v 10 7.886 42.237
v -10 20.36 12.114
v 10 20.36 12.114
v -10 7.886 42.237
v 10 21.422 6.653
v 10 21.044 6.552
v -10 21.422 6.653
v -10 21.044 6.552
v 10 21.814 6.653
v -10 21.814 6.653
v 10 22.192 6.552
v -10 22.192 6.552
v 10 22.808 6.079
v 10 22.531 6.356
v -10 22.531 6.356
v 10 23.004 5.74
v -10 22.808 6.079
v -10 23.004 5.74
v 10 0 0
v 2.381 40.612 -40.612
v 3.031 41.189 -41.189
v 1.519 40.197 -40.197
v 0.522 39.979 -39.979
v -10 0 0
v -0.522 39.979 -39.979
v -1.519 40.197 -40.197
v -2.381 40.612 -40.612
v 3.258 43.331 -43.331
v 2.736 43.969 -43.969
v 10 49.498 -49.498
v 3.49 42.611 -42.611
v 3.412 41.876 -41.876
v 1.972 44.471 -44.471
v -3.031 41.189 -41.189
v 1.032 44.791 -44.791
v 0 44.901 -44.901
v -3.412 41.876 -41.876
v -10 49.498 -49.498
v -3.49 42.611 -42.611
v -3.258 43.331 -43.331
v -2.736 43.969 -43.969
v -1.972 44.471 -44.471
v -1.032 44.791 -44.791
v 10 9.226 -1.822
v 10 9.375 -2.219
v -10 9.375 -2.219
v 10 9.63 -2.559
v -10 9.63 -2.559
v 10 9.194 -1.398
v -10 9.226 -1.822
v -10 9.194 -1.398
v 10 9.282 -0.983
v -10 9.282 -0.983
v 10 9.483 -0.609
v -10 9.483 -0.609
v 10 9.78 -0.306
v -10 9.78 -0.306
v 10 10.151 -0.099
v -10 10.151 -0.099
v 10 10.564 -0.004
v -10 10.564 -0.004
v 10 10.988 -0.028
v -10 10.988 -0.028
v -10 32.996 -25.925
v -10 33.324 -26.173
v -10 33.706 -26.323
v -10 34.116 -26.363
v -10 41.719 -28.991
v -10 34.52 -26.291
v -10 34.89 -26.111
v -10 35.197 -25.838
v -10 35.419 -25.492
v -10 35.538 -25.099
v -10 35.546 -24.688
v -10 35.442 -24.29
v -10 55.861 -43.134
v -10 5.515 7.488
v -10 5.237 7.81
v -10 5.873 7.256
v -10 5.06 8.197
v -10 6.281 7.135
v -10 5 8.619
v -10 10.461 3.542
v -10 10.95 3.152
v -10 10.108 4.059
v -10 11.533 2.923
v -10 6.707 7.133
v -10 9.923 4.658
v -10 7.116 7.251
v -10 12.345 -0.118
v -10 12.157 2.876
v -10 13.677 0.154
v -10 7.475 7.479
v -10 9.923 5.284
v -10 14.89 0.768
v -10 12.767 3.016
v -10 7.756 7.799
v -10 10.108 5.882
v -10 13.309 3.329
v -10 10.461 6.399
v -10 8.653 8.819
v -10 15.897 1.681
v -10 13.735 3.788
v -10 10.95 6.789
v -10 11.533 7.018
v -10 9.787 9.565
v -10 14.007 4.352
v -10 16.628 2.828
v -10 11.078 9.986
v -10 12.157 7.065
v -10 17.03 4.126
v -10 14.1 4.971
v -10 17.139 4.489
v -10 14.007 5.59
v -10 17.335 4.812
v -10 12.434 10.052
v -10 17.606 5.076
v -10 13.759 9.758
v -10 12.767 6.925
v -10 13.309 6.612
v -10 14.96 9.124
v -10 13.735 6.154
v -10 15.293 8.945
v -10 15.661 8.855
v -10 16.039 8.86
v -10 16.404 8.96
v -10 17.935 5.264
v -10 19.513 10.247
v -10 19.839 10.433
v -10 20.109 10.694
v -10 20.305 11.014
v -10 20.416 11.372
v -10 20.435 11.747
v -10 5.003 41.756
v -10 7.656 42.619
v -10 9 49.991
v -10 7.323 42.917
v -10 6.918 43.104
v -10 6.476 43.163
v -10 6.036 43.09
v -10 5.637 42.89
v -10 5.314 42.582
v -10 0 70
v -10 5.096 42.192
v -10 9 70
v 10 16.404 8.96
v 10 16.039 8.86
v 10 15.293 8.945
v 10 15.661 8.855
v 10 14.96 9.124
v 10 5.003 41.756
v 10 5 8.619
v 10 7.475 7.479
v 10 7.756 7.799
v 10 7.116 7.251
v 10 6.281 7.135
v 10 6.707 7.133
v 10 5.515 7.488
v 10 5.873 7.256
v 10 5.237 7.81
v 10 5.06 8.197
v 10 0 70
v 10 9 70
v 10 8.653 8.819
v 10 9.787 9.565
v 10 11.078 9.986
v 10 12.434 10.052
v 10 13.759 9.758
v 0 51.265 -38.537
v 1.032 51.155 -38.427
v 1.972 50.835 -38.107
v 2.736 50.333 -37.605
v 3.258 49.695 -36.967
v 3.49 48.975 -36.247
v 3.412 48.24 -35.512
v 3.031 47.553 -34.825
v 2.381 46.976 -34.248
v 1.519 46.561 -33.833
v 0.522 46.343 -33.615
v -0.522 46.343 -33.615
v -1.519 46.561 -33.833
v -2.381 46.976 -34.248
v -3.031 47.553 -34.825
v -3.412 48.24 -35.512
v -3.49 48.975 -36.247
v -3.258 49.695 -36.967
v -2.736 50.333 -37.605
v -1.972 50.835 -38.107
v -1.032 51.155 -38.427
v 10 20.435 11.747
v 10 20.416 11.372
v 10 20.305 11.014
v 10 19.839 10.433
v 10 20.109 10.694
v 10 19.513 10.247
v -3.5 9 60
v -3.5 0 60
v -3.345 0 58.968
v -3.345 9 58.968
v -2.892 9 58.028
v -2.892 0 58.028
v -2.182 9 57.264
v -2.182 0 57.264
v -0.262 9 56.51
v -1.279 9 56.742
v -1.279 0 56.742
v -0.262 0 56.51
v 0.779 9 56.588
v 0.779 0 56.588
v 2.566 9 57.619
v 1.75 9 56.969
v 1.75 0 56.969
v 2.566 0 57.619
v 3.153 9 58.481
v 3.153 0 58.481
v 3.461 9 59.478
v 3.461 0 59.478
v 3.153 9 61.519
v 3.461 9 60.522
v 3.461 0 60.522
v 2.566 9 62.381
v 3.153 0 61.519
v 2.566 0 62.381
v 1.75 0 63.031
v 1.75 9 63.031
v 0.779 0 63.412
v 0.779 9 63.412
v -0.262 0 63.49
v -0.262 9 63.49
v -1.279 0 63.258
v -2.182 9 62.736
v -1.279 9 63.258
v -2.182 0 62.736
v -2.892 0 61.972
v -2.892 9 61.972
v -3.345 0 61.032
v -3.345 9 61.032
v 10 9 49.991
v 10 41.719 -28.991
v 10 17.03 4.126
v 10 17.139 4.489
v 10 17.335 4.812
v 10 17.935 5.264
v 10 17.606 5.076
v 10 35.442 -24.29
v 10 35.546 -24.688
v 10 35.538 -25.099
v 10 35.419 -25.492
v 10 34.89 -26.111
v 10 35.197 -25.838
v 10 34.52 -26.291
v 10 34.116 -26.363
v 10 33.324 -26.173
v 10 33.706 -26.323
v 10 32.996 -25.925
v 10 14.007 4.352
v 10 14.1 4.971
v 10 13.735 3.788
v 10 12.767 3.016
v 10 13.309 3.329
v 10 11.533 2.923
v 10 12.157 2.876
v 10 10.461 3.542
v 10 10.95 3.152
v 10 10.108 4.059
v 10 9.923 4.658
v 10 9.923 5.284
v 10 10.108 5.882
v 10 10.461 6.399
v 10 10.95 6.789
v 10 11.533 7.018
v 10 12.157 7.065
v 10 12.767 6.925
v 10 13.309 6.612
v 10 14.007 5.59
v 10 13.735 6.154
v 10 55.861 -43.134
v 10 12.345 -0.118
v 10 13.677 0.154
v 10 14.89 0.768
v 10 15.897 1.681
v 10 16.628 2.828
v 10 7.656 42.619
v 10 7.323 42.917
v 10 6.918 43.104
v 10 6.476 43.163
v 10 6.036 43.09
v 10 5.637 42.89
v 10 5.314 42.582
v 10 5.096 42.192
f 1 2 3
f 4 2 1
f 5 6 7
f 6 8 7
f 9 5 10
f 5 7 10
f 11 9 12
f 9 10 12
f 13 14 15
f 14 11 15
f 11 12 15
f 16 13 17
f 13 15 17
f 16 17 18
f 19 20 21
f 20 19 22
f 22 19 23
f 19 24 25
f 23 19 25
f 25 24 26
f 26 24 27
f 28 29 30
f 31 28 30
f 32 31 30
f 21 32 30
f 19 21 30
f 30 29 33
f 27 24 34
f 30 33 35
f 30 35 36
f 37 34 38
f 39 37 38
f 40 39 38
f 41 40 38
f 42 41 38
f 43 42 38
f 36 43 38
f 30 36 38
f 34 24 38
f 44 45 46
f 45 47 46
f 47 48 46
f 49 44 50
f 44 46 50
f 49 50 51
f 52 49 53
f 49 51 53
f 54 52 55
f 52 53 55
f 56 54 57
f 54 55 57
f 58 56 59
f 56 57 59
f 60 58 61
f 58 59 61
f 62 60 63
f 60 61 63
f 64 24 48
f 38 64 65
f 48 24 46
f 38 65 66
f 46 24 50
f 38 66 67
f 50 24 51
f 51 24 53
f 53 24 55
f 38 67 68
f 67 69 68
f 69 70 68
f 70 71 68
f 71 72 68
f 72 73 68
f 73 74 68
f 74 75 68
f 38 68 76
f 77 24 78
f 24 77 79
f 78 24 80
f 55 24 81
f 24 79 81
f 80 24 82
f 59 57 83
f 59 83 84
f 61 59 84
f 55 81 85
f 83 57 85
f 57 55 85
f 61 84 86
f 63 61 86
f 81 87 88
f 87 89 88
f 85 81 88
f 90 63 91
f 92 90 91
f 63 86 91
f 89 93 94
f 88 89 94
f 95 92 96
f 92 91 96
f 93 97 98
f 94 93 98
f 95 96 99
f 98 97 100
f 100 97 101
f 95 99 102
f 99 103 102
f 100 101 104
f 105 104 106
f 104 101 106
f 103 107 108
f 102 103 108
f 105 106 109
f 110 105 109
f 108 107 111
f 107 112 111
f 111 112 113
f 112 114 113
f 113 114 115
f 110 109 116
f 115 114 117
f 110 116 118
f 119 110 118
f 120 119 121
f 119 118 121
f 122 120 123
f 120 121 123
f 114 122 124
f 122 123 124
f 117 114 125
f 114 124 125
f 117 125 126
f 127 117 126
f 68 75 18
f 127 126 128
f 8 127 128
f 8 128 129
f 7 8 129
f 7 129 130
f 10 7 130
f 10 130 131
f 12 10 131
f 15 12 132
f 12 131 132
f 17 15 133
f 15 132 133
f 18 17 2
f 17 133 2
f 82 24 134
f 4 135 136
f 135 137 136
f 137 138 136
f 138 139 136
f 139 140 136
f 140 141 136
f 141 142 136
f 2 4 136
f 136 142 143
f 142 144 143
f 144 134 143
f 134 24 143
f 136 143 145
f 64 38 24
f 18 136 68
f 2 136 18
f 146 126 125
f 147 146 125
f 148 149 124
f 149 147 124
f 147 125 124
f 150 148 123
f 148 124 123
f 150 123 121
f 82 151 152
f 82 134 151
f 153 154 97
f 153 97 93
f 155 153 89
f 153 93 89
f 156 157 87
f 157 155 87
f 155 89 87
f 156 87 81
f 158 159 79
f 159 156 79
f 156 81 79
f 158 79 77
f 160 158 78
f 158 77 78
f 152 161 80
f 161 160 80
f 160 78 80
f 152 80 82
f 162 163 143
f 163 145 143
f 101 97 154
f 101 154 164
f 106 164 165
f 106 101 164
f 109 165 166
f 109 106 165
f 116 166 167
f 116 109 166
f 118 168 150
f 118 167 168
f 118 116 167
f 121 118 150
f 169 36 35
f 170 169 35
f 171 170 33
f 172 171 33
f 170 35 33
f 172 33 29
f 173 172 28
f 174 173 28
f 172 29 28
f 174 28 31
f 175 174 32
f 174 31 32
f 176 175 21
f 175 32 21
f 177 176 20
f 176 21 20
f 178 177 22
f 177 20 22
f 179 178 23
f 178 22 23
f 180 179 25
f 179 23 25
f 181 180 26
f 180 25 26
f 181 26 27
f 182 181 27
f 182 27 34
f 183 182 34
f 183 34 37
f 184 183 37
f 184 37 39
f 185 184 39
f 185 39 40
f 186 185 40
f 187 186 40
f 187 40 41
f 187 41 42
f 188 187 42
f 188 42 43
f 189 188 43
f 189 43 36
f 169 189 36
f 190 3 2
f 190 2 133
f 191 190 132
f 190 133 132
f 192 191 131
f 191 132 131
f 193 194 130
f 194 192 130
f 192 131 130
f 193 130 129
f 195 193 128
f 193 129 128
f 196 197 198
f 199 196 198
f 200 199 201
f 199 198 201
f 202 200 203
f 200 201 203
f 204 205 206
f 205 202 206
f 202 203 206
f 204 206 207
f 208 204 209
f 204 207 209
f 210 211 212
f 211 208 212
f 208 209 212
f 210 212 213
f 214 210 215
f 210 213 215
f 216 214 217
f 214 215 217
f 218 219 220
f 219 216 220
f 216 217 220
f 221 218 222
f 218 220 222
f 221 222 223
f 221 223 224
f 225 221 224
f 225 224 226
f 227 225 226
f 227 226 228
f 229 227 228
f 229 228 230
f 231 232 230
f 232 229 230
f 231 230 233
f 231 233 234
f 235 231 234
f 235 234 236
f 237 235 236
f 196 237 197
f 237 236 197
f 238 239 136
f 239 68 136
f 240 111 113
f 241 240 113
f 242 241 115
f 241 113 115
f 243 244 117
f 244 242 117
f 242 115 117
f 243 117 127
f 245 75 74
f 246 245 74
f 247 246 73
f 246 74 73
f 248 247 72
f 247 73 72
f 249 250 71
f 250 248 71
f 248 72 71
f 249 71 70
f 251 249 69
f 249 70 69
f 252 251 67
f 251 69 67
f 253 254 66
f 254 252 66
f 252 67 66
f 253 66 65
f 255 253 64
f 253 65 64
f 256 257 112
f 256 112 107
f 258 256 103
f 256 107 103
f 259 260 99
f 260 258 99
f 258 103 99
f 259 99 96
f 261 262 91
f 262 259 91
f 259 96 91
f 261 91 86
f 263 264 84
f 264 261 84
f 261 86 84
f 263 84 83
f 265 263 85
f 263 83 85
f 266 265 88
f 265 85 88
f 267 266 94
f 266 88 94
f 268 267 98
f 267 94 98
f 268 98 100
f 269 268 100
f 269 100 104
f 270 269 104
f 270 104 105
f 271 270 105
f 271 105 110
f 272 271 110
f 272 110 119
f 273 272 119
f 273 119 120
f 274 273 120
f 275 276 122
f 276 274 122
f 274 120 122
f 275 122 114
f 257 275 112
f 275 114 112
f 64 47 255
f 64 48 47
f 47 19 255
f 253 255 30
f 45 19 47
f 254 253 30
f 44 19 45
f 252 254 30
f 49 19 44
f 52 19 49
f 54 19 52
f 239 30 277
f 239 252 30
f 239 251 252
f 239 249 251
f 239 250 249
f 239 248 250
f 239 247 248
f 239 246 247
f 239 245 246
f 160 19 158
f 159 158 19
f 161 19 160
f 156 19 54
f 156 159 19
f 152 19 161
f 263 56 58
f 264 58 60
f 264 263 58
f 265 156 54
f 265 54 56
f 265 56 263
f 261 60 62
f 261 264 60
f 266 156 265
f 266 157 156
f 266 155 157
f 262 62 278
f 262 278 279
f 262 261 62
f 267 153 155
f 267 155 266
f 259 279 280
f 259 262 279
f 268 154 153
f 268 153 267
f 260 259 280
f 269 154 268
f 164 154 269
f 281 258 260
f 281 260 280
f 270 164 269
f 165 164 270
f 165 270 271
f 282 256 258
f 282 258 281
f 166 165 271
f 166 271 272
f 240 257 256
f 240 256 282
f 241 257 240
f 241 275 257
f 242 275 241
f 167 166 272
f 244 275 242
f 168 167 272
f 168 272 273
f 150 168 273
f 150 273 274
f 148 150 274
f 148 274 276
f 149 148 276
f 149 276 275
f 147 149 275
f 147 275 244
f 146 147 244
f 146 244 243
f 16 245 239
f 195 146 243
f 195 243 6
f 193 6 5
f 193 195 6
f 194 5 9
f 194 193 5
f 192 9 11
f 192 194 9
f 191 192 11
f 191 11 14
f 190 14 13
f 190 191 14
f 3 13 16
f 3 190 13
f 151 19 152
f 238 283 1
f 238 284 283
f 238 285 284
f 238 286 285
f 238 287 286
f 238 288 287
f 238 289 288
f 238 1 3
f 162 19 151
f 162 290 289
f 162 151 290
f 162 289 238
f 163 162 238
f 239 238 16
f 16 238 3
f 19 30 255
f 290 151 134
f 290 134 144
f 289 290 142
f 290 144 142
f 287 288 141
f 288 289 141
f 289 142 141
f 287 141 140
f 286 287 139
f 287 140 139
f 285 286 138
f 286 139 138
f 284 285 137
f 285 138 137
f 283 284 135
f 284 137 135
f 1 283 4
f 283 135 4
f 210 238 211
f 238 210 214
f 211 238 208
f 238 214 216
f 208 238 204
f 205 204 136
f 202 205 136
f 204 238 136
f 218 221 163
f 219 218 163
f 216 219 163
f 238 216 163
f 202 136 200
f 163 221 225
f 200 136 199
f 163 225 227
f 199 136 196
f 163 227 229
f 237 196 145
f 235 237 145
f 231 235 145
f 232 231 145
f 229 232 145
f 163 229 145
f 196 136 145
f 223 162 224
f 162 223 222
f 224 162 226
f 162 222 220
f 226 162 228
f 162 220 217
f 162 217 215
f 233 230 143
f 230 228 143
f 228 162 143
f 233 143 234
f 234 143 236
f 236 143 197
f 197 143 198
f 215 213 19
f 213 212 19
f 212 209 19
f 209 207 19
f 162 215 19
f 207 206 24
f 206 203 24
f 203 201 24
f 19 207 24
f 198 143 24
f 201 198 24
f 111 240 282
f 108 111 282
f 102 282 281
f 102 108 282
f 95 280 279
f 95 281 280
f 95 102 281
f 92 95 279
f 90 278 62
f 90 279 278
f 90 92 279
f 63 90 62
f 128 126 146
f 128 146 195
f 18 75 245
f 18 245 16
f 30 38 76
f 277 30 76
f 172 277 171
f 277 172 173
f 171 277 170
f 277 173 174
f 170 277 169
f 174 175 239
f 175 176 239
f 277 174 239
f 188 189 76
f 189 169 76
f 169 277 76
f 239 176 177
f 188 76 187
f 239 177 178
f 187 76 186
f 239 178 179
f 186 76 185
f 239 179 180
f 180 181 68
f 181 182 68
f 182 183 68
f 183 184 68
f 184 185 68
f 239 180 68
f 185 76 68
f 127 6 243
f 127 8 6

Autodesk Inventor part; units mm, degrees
sketch "Sketch_8" plane through (0, 0, 0) normal (1, 0, 0) x (0, 1, 0)
  line L0 (0, 70) -> (0, 0)
  line L1 (0, 0) -> (49.4975, -49.4975)
  line L2 (49.4975, -49.4975) -> (55.8614, -43.1335)
  line L3 (55.8614, -43.1335) -> (41.7193, -28.9914)
  line L4 (41.7193, -28.9914) -> (9, 49.9914)
  line L5 (9, 49.9914) -> (9, 70)
  line L6 (9, 70) -> (0, 70)
  arc A0 (23.0035, 5.74) -> (21.0437, 6.5518) centre (21.6177, 5.166) ccw
  line L7 (21.0437, 6.5518) -> (17.935, 5.2641)
  arc A1 (17.935, 5.2641) -> (17.0297, 4.1265) centre (18.509, 3.8783) ccw
  arc A2 (10.9882, -0.0281) -> (17.0297, 4.1265) centre (12, 4.9706) ccw
  arc A3 (10.9882, -0.0281) -> (9.63, -2.5589) centre (10.6906, -1.4983) ccw
  line L8 (9.63, -2.5589) -> (32.996, -25.9249)
  arc A4 (32.996, -25.9249) -> (35.4424, -24.2902) centre (34.0566, -24.8642) ccw
  line L9 (35.4424, -24.2902) -> (23.0035, 5.74)
  circle A5 centre (12, 4.9706) radius 2.1
  arc A6 (7.8859, 42.2372) -> (5.0029, 41.7559) centre (6.5, 41.6633) ccw
  line L10 (5.0029, 41.7559) -> (5, 8.619)
  arc A7 (5, 8.619) -> (7.7564, 7.7993) centre (6.5, 8.6189) ccw
  arc A8 (14.9597, 9.1239) -> (7.7564, 7.7993) centre (12, 4.9705) ccw
  arc A9 (14.9597, 9.1239) -> (16.4042, 8.9596) centre (15.8302, 10.3455) ccw
  line L11 (16.4042, 8.9596) -> (19.5129, 10.2473)
  arc A10 (19.5129, 10.2473) -> (20.3596, 12.1145) centre (18.9389, 11.6331) ccw
  line L12 (20.3596, 12.1145) -> (7.8859, 42.2372)
extrude "Extrusion1" add sketch "Sketch_8" along normal mid plane 20
sketch "Sketch_3" plane through (0, 0, 0) normal (0, 1, 0) x (-1, 0, 0)
  circle A0 centre (0, 60) radius 3.5
extrude "Extrusion2" cut sketch "Sketch_3" along normal blind 9
sketch "Sketch_9" plane through (0, 0, 0) normal (1, 0, 0) x (0, 1, 0)
  line L0 (42.4264, -42.4264) -> (48.7904, -36.0624)
  line L1 (48.7904, -36.0624) -> (51.2652, -38.5373)
  line L2 (51.2652, -38.5373) -> (44.9013, -44.9013)
  line L3 (44.9013, -44.9013) -> (42.4264, -42.4264)
  line L4 (42.4264, -42.4264) -> (48.7904, -36.0624)
revolve "Revolution1" cut sketch "Sketch_9" angle 360 about axis through (0, 42.4264, -42.4264) along (0, -0.7071, -0.7071)
ref_plane "bracket_to_dummy_XY" through (0, 0, 0) normal (0, 1, 0) x (1, 0, 0)
ref_plane "bracket_to_dummy_YZ" through (0, 0, 0) normal (1, 0, 0) x (0, 0, -1)
ref_plane "bracket_to_dummy_ZX" through (0, 0, 0) normal (0, 0, -1) x (0, 1, 0)
ref_plane "1_to_bolt_XY" through (0, 9, 60) normal (0, 1, 0) x (1, 0, 0)
ref_plane "1_to_bolt_YZ" through (0, 9, 60) normal (1, 0, 0) x (0, 0, -1)
ref_plane "1_to_bolt_ZX" through (0, 9, 60) normal (0, 0, -1) x (0, 1, 0)
ref_plane "6_to_bolt_XY" through (0, 48.7904, -36.0624) normal (0, 0.7071, 0.7071) x (0, 0.7071, -0.7071)
ref_plane "6_to_bolt_YZ" through (0, 48.7904, -36.0624) normal (0, 0.7071, -0.7071) x (-1, 0, 0)
ref_plane "6_to_bolt_ZX" through (0, 48.7904, -36.0624) normal (-1, 0, 0) x (0, 0.7071, 0.7071)
ref_plane "7_to_bolt_XY" through (30, 48.7904, -36.0624) normal (0, 0.7071, 0.7071) x (0, 0.7071, -0.7071)
ref_plane "7_to_bolt_YZ" through (30, 48.7904, -36.0624) normal (0, 0.7071, -0.7071) x (-1, 0, 0)
ref_plane "7_to_bolt_ZX" through (30, 48.7904, -36.0624) normal (-1, 0, 0) x (0, 0.7071, 0.7071)
ref_plane "8_to_bolt_XY" through (0, 9, 60) normal (0, 1, 0) x (0, 0, -1)
ref_plane "8_to_bolt_YZ" through (0, 9, 60) normal (0, 0, -1) x (-1, 0, 0)
ref_plane "8_to_bolt_ZX" through (0, 9, 60) normal (-1, 0, 0) x (0, 1, 0)
ref_plane "9_to_bolt_XY" through (30, 9, 60) normal (0, 1, 0) x (0, 0, -1)
ref_plane "9_to_bolt_YZ" through (30, 9, 60) normal (0, 0, -1) x (-1, 0, 0)
ref_plane "9_to_bolt_ZX" through (30, 9, 60) normal (-1, 0, 0) x (0, 1, 0)
properties part number "HBL135TS6hbl45ts6"
